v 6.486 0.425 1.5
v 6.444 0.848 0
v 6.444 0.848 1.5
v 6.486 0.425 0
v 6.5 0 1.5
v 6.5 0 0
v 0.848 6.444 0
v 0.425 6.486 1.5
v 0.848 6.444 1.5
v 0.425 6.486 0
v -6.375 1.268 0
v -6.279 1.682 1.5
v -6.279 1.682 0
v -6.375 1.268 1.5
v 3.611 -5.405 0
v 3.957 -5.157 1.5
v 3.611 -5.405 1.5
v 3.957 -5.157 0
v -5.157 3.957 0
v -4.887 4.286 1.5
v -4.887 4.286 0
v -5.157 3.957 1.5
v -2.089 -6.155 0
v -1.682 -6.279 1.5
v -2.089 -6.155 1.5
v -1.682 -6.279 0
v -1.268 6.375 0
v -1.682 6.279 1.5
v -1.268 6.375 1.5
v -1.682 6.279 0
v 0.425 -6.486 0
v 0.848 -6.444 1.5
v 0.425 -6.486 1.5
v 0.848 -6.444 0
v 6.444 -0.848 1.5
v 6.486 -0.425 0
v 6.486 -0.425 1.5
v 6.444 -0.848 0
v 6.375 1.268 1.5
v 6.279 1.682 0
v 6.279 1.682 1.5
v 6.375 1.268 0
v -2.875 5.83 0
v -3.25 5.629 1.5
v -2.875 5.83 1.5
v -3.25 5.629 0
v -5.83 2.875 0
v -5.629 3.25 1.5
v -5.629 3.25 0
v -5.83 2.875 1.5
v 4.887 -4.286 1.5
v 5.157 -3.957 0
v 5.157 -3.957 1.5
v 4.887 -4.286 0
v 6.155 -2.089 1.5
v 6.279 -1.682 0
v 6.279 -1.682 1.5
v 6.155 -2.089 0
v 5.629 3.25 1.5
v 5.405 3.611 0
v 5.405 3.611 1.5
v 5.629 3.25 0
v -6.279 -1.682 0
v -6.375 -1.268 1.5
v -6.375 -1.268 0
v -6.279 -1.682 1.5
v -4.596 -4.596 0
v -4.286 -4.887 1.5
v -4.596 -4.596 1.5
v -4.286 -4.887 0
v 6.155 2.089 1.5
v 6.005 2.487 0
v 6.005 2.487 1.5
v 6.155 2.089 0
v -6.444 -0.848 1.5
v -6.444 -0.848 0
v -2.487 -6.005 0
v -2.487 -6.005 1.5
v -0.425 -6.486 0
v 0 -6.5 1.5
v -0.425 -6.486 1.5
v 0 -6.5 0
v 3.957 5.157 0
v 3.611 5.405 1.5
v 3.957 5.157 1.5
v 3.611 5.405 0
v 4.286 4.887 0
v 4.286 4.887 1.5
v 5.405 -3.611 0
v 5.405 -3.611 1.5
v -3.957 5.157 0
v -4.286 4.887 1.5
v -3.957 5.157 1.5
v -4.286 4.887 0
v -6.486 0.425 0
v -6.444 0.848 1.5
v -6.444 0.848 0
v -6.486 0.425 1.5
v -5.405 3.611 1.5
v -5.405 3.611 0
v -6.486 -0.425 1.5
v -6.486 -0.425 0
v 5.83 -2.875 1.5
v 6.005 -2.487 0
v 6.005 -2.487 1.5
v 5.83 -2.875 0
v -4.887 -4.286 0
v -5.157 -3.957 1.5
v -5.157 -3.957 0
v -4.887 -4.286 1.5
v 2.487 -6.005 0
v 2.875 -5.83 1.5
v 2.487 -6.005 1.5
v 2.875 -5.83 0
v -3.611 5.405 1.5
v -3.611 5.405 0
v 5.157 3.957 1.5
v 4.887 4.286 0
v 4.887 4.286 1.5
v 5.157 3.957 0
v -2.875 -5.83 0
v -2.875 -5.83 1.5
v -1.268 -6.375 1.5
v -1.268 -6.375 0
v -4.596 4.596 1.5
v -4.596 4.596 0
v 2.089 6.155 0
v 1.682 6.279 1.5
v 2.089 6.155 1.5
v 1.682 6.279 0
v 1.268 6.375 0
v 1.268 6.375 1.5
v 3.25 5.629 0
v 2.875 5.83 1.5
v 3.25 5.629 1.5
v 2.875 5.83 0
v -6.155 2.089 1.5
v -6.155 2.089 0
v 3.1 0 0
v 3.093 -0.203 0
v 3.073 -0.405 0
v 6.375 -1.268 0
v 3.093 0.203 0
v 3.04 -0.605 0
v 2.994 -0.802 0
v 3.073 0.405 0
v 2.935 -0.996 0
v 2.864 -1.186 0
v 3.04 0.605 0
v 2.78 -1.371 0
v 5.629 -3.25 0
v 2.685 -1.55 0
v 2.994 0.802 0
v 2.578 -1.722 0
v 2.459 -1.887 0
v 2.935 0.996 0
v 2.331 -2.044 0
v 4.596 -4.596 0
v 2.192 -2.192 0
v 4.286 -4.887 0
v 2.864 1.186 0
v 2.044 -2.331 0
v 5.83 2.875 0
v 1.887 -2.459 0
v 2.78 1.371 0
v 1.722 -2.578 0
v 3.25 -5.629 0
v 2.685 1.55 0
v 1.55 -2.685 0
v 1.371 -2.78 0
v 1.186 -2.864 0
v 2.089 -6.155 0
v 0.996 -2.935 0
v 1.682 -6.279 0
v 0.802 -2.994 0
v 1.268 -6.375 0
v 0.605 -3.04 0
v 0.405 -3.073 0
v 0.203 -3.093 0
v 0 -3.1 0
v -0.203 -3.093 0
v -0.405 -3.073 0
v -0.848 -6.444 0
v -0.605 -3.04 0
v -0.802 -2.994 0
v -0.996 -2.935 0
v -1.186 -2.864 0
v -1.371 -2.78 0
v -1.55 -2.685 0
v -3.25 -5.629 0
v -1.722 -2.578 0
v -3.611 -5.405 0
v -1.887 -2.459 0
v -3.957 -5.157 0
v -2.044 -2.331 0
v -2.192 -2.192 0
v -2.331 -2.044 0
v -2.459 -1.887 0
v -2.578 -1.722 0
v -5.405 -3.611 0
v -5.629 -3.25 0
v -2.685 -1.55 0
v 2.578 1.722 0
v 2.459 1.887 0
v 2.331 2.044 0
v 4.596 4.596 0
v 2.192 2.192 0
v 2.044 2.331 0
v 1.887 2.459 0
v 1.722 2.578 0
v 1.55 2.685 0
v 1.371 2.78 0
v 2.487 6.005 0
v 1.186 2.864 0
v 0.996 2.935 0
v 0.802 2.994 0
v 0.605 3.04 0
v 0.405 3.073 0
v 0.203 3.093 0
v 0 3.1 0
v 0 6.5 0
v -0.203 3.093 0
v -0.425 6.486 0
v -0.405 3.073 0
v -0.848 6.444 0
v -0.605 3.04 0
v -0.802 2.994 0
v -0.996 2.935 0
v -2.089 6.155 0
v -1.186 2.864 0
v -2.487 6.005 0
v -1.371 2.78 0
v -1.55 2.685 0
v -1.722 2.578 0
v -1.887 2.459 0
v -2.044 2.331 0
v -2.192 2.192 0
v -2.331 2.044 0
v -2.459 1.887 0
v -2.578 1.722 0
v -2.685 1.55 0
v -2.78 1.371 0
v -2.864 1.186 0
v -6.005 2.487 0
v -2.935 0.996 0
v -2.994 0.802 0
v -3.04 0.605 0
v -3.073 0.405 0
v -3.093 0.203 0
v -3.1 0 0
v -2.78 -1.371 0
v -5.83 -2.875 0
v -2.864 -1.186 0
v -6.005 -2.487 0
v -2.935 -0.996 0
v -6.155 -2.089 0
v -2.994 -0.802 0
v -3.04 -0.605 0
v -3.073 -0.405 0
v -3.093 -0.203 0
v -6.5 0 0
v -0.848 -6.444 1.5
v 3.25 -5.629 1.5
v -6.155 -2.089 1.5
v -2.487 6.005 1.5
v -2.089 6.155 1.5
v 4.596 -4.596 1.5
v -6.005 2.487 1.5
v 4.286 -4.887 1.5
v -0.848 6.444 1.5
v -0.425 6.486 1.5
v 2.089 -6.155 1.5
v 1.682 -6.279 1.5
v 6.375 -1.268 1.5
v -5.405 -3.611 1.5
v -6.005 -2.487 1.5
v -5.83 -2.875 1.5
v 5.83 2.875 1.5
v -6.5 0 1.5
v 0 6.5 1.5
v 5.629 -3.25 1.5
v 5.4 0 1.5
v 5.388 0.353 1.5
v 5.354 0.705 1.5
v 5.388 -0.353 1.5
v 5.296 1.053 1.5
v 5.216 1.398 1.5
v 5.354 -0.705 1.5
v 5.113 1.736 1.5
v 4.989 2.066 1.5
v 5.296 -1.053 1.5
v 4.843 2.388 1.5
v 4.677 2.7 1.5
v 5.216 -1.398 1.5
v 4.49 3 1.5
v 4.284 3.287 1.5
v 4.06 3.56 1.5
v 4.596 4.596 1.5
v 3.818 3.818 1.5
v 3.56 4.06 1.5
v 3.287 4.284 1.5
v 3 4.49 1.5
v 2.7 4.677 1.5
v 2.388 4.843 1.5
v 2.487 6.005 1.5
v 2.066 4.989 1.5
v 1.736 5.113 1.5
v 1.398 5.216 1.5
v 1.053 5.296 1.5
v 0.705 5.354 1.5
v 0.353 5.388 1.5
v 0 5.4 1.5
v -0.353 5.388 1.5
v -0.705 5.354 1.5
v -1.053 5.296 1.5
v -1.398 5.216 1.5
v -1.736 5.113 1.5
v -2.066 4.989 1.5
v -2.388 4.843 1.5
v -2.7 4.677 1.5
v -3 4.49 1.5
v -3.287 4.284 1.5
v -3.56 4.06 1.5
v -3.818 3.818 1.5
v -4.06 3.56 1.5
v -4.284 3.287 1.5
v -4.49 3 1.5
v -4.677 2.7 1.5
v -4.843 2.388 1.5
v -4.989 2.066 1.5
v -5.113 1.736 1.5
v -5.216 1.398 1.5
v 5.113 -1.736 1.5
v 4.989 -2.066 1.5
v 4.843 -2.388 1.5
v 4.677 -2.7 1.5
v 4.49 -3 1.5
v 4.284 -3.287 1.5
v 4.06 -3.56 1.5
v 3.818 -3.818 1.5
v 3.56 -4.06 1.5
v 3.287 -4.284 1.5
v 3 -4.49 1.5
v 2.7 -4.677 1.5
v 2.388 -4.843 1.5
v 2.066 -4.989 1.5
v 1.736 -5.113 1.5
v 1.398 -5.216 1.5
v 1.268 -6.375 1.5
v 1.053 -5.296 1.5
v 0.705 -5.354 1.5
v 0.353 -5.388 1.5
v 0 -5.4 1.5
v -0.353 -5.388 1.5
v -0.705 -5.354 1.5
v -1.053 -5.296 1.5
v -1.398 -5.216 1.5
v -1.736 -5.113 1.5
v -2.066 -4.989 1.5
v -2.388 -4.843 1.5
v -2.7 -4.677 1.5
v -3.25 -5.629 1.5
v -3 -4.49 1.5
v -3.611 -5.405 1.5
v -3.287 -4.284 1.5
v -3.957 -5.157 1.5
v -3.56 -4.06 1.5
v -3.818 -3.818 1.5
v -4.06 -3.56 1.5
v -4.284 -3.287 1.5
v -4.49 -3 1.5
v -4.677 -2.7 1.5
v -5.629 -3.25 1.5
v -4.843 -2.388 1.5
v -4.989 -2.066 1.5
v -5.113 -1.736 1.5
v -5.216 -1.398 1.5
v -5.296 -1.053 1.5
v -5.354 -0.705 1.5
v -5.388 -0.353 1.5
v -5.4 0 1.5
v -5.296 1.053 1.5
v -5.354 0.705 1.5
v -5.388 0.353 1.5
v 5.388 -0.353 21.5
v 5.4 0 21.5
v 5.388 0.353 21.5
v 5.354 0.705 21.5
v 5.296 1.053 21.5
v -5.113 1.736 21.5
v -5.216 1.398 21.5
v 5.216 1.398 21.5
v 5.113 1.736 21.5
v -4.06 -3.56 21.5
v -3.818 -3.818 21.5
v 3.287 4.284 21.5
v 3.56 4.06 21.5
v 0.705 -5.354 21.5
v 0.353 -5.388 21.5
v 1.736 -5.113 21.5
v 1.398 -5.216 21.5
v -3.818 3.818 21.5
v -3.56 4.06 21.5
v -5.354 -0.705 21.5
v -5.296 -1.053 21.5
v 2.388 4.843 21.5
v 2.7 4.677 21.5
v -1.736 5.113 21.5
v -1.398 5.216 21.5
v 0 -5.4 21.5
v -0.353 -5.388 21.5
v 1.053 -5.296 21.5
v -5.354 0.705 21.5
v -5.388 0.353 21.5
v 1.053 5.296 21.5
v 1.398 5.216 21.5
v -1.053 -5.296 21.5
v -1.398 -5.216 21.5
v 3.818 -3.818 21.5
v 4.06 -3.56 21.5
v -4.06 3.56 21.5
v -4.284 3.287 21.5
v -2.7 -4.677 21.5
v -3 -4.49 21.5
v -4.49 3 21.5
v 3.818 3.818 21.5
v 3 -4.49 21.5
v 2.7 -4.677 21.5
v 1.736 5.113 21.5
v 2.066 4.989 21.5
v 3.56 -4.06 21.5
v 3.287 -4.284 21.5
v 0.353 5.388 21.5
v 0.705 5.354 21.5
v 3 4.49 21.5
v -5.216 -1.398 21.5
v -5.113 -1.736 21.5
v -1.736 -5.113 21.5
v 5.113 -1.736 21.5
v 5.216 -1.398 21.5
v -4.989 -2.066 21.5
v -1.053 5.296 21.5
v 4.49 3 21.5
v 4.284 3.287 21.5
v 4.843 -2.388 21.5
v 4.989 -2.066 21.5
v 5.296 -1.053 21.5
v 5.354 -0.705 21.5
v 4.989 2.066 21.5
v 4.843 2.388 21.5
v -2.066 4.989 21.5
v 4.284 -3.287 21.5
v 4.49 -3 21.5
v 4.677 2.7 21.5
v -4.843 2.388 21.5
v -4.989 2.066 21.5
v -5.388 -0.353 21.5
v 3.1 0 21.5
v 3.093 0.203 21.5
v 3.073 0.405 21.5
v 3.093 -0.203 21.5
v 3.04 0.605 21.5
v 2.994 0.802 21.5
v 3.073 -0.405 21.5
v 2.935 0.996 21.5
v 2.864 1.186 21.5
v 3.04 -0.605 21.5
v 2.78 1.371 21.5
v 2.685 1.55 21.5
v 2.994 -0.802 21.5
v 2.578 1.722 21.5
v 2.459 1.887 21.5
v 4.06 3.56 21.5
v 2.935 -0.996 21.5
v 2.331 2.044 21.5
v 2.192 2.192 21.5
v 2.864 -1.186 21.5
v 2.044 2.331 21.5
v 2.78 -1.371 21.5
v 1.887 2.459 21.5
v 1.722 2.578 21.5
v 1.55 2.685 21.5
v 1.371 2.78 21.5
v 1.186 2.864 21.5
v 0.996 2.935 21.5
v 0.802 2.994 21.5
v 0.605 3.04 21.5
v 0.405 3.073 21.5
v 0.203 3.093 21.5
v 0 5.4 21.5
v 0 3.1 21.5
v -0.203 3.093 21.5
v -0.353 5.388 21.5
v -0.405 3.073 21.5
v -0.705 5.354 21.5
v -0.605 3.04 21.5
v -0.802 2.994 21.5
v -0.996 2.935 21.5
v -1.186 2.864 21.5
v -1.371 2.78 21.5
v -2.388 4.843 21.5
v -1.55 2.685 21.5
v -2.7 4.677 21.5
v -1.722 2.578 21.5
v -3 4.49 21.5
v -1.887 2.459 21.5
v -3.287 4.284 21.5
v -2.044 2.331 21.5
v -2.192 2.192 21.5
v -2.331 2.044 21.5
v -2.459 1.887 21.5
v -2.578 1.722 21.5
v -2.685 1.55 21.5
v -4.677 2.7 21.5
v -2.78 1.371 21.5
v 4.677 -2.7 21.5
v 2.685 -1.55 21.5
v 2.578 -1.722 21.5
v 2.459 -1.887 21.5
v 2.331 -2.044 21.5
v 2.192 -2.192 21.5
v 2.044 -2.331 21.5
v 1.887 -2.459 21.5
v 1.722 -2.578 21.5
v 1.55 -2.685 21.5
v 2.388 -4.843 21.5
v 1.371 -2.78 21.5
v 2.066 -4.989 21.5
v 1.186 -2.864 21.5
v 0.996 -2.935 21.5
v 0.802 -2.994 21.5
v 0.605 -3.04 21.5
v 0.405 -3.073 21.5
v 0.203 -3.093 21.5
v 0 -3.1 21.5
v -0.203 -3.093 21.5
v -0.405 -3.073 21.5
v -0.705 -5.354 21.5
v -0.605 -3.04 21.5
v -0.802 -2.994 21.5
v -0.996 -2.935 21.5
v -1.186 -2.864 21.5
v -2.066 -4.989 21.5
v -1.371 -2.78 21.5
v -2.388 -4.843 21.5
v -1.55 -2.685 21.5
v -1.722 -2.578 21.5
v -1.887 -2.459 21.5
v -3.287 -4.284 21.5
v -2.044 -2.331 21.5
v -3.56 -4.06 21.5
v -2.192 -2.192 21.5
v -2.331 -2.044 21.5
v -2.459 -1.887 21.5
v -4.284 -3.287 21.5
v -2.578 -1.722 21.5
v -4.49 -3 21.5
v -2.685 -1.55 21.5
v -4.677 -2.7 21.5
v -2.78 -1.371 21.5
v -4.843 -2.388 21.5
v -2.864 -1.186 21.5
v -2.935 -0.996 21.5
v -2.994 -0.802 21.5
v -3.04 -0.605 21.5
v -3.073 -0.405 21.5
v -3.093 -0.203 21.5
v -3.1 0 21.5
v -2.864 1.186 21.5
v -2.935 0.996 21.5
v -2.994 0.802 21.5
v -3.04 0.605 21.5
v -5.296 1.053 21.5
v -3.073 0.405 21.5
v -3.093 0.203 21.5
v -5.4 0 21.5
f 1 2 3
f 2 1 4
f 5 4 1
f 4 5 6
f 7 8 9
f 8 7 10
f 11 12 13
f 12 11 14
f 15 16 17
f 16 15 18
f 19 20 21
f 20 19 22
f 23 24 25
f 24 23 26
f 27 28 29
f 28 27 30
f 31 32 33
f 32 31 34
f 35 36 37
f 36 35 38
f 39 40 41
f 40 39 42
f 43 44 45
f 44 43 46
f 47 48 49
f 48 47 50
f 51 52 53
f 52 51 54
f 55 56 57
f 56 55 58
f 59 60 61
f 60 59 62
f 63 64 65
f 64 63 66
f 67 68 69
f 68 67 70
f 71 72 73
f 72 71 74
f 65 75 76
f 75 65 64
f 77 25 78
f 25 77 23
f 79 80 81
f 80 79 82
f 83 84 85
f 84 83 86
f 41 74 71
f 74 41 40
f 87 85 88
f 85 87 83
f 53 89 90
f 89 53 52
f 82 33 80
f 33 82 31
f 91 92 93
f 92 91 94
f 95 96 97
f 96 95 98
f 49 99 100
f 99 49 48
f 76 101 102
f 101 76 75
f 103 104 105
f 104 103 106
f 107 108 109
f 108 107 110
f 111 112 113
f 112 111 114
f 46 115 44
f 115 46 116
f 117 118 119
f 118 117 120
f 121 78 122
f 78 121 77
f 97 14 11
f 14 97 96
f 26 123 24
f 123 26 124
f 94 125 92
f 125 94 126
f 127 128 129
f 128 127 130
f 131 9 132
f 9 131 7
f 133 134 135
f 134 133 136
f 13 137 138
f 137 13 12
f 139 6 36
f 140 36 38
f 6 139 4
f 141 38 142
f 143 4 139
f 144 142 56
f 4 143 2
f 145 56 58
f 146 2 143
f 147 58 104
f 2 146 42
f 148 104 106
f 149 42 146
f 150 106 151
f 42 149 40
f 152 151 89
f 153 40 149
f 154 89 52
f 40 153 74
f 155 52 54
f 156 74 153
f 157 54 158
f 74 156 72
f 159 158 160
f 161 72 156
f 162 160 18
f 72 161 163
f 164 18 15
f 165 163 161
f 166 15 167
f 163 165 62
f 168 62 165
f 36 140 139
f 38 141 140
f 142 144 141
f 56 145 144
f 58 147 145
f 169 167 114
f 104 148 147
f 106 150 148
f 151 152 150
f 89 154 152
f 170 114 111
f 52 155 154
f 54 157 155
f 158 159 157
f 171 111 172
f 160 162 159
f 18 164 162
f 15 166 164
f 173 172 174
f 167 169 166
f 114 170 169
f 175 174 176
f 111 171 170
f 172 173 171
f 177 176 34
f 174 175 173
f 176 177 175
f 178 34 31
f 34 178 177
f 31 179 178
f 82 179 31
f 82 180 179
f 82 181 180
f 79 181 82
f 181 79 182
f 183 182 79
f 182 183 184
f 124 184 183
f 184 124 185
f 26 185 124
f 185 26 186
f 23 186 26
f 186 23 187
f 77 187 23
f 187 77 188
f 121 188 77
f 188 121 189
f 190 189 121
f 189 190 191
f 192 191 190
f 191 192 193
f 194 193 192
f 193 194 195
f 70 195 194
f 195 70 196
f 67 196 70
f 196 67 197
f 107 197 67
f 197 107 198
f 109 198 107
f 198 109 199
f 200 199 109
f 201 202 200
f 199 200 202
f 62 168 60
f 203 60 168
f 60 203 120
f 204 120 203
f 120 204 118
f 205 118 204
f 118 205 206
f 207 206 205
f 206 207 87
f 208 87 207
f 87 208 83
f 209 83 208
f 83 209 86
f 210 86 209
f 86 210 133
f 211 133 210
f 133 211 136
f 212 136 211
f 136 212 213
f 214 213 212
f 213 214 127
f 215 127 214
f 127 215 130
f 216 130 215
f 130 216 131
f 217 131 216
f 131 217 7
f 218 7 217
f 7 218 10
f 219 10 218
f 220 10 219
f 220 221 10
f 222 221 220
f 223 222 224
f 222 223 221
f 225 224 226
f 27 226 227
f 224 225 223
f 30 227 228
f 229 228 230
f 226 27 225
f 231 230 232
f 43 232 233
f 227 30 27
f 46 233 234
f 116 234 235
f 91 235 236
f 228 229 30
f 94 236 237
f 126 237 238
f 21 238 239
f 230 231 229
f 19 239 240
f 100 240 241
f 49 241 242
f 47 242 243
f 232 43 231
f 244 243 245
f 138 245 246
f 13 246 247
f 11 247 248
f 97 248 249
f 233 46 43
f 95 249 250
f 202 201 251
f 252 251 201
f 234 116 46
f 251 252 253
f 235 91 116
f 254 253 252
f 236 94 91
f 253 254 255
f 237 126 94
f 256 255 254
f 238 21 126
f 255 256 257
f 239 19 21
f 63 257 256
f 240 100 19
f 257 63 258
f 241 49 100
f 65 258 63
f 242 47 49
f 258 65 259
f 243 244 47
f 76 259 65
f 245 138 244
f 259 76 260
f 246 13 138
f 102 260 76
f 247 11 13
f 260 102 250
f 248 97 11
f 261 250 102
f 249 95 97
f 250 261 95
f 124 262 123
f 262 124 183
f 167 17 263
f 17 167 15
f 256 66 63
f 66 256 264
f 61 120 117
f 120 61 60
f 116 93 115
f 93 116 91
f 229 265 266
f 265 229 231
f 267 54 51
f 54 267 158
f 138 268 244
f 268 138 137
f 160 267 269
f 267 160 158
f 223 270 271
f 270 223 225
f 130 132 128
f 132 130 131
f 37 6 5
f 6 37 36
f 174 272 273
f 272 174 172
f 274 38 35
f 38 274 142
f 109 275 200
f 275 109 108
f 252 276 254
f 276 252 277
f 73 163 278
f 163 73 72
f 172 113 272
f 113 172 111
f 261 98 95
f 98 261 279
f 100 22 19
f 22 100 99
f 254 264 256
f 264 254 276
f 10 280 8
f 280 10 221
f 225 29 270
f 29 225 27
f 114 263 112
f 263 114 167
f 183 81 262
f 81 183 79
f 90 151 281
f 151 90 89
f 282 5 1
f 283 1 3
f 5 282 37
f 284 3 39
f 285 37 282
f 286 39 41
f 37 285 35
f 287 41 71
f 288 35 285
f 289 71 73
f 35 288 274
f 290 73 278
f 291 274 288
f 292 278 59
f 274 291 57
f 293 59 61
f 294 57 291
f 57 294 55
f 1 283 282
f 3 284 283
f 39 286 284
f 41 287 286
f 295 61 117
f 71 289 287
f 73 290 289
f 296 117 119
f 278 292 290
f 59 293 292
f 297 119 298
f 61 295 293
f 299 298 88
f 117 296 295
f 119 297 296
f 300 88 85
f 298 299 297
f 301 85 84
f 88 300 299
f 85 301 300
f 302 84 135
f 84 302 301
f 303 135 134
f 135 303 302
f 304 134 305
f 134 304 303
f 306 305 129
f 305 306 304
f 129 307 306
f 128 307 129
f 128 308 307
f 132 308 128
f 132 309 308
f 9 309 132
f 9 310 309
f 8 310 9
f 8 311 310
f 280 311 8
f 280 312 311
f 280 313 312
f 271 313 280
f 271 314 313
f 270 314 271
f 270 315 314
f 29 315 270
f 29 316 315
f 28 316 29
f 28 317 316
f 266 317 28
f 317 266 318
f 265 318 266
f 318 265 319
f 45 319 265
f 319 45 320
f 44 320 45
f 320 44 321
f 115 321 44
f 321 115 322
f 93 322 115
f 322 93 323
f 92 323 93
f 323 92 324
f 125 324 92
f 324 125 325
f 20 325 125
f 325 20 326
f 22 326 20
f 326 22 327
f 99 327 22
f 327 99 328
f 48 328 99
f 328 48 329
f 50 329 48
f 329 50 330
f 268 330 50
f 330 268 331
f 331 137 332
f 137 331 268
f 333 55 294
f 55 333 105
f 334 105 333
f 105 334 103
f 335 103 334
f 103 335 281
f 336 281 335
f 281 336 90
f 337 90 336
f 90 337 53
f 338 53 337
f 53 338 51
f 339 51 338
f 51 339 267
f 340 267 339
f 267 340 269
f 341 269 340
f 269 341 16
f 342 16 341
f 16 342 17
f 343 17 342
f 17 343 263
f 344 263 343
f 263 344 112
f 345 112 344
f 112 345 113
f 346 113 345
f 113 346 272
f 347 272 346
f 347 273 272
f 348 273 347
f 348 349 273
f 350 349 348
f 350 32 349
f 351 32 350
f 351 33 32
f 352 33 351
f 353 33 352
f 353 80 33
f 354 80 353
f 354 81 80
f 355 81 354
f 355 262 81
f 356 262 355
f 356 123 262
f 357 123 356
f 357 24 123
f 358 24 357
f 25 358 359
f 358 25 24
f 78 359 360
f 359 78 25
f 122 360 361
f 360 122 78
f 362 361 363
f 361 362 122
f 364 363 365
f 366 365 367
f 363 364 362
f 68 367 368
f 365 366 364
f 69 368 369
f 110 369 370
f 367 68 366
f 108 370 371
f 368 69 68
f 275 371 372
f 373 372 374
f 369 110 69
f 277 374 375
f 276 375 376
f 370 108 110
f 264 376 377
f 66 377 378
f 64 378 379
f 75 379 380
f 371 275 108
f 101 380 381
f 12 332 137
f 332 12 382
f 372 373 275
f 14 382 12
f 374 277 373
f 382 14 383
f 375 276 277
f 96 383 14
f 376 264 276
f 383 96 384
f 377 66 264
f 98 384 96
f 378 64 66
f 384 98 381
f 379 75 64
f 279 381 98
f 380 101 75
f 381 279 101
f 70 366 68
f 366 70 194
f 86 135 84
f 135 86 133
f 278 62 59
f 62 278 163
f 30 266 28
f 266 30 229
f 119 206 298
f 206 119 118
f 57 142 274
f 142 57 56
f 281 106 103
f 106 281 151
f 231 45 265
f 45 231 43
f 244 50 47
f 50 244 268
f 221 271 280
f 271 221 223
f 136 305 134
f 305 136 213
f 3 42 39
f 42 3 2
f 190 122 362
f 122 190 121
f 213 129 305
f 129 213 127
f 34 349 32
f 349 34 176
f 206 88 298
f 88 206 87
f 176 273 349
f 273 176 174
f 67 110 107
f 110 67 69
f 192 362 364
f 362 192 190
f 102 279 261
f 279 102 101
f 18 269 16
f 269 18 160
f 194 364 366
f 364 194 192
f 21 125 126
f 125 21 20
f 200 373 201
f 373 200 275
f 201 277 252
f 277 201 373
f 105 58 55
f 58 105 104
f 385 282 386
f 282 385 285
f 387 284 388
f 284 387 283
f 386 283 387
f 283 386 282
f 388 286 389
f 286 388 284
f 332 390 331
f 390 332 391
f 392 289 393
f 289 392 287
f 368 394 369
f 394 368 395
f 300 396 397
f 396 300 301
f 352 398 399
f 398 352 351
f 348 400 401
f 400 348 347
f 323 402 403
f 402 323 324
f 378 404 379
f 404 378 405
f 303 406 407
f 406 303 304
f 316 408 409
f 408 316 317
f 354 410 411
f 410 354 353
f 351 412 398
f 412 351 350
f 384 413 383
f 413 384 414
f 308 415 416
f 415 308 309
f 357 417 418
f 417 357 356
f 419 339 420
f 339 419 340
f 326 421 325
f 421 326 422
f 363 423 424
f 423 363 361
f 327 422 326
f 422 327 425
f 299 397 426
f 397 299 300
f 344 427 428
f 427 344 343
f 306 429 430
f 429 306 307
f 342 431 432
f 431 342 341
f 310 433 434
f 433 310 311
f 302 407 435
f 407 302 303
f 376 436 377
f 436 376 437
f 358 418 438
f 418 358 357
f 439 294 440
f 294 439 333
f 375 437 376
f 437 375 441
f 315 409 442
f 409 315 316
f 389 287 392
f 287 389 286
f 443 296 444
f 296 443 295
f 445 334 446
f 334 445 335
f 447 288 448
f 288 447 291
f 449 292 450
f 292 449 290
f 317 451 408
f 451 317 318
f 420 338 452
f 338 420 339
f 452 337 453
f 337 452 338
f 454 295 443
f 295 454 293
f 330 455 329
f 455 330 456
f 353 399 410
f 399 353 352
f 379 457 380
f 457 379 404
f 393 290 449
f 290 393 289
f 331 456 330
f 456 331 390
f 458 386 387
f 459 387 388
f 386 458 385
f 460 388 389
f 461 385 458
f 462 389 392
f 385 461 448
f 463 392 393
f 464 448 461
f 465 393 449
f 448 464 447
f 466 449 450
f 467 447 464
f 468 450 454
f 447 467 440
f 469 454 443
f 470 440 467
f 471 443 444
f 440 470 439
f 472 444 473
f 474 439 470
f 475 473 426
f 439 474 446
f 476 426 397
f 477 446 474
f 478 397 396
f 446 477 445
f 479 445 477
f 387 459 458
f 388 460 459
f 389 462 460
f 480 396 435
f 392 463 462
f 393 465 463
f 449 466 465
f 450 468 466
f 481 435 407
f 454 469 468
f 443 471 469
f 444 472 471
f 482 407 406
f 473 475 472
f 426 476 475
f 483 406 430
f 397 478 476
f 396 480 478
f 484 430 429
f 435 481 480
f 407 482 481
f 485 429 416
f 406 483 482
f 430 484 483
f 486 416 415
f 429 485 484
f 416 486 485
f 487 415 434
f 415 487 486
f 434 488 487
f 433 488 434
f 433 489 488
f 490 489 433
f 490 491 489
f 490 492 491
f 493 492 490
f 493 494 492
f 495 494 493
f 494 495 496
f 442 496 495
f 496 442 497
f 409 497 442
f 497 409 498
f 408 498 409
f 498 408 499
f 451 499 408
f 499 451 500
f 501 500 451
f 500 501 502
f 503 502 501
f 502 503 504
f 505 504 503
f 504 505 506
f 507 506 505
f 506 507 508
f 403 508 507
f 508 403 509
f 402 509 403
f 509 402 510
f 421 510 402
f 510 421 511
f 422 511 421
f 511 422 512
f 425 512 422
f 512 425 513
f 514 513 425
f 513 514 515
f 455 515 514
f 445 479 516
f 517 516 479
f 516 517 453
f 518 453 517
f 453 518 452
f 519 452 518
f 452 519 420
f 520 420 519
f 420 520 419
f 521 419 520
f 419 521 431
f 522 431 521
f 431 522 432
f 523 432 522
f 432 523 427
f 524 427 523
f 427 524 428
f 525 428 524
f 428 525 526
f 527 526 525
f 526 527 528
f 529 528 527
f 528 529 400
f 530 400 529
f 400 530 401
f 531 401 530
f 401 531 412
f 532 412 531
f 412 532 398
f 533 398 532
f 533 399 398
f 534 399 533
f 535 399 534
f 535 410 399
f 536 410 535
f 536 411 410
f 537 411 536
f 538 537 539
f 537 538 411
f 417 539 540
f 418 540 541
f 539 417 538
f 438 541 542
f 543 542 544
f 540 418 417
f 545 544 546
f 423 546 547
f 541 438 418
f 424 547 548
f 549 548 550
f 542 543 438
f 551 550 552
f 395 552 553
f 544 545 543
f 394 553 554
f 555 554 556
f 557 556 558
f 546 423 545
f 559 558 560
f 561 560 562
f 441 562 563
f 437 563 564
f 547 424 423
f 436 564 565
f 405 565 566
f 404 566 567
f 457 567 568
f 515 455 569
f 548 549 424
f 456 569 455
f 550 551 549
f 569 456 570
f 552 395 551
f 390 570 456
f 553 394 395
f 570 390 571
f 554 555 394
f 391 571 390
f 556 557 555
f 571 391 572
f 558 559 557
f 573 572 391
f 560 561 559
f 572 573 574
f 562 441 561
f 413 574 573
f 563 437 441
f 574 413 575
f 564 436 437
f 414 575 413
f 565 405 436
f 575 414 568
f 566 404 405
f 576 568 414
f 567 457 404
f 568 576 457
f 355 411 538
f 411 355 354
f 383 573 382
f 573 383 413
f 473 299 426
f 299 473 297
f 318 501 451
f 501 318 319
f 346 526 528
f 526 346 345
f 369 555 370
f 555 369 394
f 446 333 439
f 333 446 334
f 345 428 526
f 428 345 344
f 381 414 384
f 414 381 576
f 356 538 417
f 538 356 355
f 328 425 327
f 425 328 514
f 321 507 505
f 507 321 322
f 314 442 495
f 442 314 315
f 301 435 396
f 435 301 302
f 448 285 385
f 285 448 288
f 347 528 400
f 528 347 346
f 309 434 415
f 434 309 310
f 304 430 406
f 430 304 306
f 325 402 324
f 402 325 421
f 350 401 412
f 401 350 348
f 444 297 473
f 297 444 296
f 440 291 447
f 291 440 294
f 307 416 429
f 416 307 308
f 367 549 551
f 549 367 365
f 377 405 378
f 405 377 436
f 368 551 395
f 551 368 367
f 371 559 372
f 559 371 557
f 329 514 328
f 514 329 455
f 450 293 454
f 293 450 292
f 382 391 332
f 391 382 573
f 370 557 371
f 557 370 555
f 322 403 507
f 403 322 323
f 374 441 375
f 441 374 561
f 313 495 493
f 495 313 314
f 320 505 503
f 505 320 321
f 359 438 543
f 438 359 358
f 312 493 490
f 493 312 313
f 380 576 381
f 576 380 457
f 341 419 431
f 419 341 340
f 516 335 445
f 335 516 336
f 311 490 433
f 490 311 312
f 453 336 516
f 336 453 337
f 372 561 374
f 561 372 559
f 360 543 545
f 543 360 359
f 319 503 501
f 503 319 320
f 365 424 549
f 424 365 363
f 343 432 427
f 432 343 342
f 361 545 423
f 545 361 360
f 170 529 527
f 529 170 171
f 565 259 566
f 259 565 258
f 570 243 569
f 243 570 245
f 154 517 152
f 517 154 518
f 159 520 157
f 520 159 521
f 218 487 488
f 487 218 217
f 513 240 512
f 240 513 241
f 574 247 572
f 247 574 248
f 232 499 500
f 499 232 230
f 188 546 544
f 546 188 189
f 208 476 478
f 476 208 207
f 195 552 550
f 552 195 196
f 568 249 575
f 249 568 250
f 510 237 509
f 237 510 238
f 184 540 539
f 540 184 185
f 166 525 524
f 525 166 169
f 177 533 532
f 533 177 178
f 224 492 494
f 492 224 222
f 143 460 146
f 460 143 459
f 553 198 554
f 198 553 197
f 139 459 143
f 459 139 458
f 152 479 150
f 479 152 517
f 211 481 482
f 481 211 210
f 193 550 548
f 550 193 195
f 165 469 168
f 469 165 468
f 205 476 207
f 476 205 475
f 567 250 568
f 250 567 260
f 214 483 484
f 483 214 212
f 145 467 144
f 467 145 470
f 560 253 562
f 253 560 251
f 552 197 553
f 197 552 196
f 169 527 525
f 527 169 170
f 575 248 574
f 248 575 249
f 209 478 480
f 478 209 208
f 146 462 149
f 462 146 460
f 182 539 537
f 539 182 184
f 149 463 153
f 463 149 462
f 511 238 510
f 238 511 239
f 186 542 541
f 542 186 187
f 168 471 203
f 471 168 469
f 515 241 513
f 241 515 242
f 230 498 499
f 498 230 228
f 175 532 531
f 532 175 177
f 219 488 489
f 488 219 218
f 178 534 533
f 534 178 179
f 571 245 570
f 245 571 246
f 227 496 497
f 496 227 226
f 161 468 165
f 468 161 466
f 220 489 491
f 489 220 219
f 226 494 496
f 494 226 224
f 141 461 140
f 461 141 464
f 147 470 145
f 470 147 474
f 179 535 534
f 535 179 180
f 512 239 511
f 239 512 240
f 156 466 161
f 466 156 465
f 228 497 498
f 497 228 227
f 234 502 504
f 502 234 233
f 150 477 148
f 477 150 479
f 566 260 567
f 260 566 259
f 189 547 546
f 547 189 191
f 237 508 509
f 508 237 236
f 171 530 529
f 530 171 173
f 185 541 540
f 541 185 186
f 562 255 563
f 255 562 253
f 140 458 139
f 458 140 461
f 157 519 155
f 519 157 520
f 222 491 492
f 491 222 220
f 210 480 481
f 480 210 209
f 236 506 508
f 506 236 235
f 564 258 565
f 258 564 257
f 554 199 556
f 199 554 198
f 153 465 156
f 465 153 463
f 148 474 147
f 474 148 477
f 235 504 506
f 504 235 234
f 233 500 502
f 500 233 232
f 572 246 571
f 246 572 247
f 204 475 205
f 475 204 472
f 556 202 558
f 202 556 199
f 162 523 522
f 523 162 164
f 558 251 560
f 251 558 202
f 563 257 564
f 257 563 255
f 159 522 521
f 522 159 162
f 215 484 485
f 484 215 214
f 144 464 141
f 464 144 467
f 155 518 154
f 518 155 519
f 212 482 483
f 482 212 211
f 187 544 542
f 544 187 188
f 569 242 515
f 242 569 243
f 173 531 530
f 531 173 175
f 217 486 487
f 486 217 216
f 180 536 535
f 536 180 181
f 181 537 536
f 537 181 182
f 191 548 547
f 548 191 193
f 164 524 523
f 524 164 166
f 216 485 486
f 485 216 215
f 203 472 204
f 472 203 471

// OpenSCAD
// PCR tube (0.2 mL) adapter sleeve for 1.5 mL rack holes
// Printed upside down: collar on the bed, sleeve body rising upward.

$fn = 96;

// ---- Dimensions (mm) ----
collar_d      = 13.0;   // collar outer diameter
collar_h      = 1.5;    // collar thickness (z = 0 to 1.5)
body_d        = 10.8;   // sleeve body outer diameter
total_h       = 21.5;   // overall height (top of sleeve body)
bore_d        = 6.2;    // straight through-bore diameter
eps           = 0.5;    // cutter overshoot past faces

// ---- Model ----
difference() {
    union() {
        // Collar lying on the bed
        cylinder(d = collar_d, h = collar_h);
        // Sleeve body from collar up to total height
        translate([0, 0, collar_h - 0.01])
            cylinder(d = body_d, h = total_h - collar_h + 0.01);
    }
    // Through-bore, open at both ends
    translate([0, 0, -eps])
        cylinder(d = bore_d, h = total_h + 2 * eps);
}
